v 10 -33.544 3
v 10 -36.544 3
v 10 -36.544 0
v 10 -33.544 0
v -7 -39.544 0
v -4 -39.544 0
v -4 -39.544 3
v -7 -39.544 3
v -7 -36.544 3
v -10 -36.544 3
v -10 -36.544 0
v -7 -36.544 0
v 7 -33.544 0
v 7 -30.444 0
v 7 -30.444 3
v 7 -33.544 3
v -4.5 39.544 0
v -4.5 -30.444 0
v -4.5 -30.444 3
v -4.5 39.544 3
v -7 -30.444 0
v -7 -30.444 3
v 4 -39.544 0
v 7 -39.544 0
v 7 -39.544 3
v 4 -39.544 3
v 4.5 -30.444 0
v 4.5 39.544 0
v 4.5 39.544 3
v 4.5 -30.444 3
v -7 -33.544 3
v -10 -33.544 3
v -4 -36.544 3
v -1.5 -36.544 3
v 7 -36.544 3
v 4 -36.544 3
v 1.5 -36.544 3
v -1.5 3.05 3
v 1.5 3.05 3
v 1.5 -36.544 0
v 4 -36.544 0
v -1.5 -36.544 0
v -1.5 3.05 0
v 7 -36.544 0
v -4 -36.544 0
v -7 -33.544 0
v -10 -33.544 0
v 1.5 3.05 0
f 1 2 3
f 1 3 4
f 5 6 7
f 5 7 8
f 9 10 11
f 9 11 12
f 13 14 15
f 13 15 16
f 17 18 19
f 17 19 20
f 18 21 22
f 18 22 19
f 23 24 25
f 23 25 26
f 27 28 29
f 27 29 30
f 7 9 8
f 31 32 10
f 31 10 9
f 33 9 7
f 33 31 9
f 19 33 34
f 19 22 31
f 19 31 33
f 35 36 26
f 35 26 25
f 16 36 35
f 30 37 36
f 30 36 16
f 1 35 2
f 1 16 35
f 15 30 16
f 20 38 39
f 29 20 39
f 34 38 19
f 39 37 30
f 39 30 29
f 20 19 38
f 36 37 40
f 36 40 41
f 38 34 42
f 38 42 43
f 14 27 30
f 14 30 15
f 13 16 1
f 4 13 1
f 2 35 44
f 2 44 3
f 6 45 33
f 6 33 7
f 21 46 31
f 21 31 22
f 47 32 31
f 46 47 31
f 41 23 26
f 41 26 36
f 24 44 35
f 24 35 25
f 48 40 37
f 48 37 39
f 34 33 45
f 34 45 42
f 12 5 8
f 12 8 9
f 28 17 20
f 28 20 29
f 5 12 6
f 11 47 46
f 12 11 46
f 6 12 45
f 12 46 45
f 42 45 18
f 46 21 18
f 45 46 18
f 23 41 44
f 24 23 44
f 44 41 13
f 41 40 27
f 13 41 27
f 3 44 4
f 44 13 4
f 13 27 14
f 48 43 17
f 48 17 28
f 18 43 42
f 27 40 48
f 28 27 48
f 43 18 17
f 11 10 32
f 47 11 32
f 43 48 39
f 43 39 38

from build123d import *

# Parameters (mm, degrees)
EXTRUDE_1_DEPTH     = 3
SKETCH_2_W          = 3
SKETCH_2_H          = 36.493999941
CUT_EXTRUDE_1_DEPTH = 3
SKETCH_3_W          = 3
SKETCH_3_H          = 3
EXTRUDE_2_DEPTH     = 3
SKETCH_5_W          = 2.5
SKETCH_5_H          = 3.1
EXTRUDE_3_DEPTH     = 3


with BuildPart() as part:
    # 스케치1 → 보스-돌출1 (new body)
    with BuildSketch(Plane.XY):
        Polygon((-4.5, 39.543999941), (4.5, 39.543999941), (4.5, -30.443999941), (7, -30.443999941), (7, -39.543999941), (4, -39.543999941), (4, -33.443999941), (-4, -33.443999941), (-4, -39.543999941), (-7, -39.543999941), (-7, -30.443999941), (-4.5, -30.443999941), align=None)
    extrude(amount=EXTRUDE_1_DEPTH)

    # 스케치2 → 컷-돌출1 (cut)
    with BuildSketch(Plane(origin=(0, 0, 0), x_dir=(-1, 0, 0), z_dir=(0, 0, -1))):
        with Locations((0, -15.196999971)):
            Rectangle(SKETCH_2_W, SKETCH_2_H)
    extrude(amount=-CUT_EXTRUDE_1_DEPTH, mode=Mode.SUBTRACT)

    # 스케치3 → 보스-돌출2 (add)
    with BuildSketch(Plane.XY.offset(3)):
        with Locations((-8.5, -35.043999941)):
            Rectangle(SKETCH_3_W, SKETCH_3_H)
        with Locations((8.5, -35.043999941)):
            Rectangle(SKETCH_3_W, SKETCH_3_H)
    extrude(amount=-EXTRUDE_2_DEPTH)

    # 스케치5 → 보스-돌출3 (add)
    with BuildSketch(Plane.XY.offset(3)):
        with Locations((-2.75, -34.993999941)):
            Rectangle(SKETCH_5_W, SKETCH_5_H)
        with Locations((2.75, -34.993999941)):
            Rectangle(SKETCH_5_W, SKETCH_5_H)
    extrude(amount=-EXTRUDE_3_DEPTH)


solid = part.part
